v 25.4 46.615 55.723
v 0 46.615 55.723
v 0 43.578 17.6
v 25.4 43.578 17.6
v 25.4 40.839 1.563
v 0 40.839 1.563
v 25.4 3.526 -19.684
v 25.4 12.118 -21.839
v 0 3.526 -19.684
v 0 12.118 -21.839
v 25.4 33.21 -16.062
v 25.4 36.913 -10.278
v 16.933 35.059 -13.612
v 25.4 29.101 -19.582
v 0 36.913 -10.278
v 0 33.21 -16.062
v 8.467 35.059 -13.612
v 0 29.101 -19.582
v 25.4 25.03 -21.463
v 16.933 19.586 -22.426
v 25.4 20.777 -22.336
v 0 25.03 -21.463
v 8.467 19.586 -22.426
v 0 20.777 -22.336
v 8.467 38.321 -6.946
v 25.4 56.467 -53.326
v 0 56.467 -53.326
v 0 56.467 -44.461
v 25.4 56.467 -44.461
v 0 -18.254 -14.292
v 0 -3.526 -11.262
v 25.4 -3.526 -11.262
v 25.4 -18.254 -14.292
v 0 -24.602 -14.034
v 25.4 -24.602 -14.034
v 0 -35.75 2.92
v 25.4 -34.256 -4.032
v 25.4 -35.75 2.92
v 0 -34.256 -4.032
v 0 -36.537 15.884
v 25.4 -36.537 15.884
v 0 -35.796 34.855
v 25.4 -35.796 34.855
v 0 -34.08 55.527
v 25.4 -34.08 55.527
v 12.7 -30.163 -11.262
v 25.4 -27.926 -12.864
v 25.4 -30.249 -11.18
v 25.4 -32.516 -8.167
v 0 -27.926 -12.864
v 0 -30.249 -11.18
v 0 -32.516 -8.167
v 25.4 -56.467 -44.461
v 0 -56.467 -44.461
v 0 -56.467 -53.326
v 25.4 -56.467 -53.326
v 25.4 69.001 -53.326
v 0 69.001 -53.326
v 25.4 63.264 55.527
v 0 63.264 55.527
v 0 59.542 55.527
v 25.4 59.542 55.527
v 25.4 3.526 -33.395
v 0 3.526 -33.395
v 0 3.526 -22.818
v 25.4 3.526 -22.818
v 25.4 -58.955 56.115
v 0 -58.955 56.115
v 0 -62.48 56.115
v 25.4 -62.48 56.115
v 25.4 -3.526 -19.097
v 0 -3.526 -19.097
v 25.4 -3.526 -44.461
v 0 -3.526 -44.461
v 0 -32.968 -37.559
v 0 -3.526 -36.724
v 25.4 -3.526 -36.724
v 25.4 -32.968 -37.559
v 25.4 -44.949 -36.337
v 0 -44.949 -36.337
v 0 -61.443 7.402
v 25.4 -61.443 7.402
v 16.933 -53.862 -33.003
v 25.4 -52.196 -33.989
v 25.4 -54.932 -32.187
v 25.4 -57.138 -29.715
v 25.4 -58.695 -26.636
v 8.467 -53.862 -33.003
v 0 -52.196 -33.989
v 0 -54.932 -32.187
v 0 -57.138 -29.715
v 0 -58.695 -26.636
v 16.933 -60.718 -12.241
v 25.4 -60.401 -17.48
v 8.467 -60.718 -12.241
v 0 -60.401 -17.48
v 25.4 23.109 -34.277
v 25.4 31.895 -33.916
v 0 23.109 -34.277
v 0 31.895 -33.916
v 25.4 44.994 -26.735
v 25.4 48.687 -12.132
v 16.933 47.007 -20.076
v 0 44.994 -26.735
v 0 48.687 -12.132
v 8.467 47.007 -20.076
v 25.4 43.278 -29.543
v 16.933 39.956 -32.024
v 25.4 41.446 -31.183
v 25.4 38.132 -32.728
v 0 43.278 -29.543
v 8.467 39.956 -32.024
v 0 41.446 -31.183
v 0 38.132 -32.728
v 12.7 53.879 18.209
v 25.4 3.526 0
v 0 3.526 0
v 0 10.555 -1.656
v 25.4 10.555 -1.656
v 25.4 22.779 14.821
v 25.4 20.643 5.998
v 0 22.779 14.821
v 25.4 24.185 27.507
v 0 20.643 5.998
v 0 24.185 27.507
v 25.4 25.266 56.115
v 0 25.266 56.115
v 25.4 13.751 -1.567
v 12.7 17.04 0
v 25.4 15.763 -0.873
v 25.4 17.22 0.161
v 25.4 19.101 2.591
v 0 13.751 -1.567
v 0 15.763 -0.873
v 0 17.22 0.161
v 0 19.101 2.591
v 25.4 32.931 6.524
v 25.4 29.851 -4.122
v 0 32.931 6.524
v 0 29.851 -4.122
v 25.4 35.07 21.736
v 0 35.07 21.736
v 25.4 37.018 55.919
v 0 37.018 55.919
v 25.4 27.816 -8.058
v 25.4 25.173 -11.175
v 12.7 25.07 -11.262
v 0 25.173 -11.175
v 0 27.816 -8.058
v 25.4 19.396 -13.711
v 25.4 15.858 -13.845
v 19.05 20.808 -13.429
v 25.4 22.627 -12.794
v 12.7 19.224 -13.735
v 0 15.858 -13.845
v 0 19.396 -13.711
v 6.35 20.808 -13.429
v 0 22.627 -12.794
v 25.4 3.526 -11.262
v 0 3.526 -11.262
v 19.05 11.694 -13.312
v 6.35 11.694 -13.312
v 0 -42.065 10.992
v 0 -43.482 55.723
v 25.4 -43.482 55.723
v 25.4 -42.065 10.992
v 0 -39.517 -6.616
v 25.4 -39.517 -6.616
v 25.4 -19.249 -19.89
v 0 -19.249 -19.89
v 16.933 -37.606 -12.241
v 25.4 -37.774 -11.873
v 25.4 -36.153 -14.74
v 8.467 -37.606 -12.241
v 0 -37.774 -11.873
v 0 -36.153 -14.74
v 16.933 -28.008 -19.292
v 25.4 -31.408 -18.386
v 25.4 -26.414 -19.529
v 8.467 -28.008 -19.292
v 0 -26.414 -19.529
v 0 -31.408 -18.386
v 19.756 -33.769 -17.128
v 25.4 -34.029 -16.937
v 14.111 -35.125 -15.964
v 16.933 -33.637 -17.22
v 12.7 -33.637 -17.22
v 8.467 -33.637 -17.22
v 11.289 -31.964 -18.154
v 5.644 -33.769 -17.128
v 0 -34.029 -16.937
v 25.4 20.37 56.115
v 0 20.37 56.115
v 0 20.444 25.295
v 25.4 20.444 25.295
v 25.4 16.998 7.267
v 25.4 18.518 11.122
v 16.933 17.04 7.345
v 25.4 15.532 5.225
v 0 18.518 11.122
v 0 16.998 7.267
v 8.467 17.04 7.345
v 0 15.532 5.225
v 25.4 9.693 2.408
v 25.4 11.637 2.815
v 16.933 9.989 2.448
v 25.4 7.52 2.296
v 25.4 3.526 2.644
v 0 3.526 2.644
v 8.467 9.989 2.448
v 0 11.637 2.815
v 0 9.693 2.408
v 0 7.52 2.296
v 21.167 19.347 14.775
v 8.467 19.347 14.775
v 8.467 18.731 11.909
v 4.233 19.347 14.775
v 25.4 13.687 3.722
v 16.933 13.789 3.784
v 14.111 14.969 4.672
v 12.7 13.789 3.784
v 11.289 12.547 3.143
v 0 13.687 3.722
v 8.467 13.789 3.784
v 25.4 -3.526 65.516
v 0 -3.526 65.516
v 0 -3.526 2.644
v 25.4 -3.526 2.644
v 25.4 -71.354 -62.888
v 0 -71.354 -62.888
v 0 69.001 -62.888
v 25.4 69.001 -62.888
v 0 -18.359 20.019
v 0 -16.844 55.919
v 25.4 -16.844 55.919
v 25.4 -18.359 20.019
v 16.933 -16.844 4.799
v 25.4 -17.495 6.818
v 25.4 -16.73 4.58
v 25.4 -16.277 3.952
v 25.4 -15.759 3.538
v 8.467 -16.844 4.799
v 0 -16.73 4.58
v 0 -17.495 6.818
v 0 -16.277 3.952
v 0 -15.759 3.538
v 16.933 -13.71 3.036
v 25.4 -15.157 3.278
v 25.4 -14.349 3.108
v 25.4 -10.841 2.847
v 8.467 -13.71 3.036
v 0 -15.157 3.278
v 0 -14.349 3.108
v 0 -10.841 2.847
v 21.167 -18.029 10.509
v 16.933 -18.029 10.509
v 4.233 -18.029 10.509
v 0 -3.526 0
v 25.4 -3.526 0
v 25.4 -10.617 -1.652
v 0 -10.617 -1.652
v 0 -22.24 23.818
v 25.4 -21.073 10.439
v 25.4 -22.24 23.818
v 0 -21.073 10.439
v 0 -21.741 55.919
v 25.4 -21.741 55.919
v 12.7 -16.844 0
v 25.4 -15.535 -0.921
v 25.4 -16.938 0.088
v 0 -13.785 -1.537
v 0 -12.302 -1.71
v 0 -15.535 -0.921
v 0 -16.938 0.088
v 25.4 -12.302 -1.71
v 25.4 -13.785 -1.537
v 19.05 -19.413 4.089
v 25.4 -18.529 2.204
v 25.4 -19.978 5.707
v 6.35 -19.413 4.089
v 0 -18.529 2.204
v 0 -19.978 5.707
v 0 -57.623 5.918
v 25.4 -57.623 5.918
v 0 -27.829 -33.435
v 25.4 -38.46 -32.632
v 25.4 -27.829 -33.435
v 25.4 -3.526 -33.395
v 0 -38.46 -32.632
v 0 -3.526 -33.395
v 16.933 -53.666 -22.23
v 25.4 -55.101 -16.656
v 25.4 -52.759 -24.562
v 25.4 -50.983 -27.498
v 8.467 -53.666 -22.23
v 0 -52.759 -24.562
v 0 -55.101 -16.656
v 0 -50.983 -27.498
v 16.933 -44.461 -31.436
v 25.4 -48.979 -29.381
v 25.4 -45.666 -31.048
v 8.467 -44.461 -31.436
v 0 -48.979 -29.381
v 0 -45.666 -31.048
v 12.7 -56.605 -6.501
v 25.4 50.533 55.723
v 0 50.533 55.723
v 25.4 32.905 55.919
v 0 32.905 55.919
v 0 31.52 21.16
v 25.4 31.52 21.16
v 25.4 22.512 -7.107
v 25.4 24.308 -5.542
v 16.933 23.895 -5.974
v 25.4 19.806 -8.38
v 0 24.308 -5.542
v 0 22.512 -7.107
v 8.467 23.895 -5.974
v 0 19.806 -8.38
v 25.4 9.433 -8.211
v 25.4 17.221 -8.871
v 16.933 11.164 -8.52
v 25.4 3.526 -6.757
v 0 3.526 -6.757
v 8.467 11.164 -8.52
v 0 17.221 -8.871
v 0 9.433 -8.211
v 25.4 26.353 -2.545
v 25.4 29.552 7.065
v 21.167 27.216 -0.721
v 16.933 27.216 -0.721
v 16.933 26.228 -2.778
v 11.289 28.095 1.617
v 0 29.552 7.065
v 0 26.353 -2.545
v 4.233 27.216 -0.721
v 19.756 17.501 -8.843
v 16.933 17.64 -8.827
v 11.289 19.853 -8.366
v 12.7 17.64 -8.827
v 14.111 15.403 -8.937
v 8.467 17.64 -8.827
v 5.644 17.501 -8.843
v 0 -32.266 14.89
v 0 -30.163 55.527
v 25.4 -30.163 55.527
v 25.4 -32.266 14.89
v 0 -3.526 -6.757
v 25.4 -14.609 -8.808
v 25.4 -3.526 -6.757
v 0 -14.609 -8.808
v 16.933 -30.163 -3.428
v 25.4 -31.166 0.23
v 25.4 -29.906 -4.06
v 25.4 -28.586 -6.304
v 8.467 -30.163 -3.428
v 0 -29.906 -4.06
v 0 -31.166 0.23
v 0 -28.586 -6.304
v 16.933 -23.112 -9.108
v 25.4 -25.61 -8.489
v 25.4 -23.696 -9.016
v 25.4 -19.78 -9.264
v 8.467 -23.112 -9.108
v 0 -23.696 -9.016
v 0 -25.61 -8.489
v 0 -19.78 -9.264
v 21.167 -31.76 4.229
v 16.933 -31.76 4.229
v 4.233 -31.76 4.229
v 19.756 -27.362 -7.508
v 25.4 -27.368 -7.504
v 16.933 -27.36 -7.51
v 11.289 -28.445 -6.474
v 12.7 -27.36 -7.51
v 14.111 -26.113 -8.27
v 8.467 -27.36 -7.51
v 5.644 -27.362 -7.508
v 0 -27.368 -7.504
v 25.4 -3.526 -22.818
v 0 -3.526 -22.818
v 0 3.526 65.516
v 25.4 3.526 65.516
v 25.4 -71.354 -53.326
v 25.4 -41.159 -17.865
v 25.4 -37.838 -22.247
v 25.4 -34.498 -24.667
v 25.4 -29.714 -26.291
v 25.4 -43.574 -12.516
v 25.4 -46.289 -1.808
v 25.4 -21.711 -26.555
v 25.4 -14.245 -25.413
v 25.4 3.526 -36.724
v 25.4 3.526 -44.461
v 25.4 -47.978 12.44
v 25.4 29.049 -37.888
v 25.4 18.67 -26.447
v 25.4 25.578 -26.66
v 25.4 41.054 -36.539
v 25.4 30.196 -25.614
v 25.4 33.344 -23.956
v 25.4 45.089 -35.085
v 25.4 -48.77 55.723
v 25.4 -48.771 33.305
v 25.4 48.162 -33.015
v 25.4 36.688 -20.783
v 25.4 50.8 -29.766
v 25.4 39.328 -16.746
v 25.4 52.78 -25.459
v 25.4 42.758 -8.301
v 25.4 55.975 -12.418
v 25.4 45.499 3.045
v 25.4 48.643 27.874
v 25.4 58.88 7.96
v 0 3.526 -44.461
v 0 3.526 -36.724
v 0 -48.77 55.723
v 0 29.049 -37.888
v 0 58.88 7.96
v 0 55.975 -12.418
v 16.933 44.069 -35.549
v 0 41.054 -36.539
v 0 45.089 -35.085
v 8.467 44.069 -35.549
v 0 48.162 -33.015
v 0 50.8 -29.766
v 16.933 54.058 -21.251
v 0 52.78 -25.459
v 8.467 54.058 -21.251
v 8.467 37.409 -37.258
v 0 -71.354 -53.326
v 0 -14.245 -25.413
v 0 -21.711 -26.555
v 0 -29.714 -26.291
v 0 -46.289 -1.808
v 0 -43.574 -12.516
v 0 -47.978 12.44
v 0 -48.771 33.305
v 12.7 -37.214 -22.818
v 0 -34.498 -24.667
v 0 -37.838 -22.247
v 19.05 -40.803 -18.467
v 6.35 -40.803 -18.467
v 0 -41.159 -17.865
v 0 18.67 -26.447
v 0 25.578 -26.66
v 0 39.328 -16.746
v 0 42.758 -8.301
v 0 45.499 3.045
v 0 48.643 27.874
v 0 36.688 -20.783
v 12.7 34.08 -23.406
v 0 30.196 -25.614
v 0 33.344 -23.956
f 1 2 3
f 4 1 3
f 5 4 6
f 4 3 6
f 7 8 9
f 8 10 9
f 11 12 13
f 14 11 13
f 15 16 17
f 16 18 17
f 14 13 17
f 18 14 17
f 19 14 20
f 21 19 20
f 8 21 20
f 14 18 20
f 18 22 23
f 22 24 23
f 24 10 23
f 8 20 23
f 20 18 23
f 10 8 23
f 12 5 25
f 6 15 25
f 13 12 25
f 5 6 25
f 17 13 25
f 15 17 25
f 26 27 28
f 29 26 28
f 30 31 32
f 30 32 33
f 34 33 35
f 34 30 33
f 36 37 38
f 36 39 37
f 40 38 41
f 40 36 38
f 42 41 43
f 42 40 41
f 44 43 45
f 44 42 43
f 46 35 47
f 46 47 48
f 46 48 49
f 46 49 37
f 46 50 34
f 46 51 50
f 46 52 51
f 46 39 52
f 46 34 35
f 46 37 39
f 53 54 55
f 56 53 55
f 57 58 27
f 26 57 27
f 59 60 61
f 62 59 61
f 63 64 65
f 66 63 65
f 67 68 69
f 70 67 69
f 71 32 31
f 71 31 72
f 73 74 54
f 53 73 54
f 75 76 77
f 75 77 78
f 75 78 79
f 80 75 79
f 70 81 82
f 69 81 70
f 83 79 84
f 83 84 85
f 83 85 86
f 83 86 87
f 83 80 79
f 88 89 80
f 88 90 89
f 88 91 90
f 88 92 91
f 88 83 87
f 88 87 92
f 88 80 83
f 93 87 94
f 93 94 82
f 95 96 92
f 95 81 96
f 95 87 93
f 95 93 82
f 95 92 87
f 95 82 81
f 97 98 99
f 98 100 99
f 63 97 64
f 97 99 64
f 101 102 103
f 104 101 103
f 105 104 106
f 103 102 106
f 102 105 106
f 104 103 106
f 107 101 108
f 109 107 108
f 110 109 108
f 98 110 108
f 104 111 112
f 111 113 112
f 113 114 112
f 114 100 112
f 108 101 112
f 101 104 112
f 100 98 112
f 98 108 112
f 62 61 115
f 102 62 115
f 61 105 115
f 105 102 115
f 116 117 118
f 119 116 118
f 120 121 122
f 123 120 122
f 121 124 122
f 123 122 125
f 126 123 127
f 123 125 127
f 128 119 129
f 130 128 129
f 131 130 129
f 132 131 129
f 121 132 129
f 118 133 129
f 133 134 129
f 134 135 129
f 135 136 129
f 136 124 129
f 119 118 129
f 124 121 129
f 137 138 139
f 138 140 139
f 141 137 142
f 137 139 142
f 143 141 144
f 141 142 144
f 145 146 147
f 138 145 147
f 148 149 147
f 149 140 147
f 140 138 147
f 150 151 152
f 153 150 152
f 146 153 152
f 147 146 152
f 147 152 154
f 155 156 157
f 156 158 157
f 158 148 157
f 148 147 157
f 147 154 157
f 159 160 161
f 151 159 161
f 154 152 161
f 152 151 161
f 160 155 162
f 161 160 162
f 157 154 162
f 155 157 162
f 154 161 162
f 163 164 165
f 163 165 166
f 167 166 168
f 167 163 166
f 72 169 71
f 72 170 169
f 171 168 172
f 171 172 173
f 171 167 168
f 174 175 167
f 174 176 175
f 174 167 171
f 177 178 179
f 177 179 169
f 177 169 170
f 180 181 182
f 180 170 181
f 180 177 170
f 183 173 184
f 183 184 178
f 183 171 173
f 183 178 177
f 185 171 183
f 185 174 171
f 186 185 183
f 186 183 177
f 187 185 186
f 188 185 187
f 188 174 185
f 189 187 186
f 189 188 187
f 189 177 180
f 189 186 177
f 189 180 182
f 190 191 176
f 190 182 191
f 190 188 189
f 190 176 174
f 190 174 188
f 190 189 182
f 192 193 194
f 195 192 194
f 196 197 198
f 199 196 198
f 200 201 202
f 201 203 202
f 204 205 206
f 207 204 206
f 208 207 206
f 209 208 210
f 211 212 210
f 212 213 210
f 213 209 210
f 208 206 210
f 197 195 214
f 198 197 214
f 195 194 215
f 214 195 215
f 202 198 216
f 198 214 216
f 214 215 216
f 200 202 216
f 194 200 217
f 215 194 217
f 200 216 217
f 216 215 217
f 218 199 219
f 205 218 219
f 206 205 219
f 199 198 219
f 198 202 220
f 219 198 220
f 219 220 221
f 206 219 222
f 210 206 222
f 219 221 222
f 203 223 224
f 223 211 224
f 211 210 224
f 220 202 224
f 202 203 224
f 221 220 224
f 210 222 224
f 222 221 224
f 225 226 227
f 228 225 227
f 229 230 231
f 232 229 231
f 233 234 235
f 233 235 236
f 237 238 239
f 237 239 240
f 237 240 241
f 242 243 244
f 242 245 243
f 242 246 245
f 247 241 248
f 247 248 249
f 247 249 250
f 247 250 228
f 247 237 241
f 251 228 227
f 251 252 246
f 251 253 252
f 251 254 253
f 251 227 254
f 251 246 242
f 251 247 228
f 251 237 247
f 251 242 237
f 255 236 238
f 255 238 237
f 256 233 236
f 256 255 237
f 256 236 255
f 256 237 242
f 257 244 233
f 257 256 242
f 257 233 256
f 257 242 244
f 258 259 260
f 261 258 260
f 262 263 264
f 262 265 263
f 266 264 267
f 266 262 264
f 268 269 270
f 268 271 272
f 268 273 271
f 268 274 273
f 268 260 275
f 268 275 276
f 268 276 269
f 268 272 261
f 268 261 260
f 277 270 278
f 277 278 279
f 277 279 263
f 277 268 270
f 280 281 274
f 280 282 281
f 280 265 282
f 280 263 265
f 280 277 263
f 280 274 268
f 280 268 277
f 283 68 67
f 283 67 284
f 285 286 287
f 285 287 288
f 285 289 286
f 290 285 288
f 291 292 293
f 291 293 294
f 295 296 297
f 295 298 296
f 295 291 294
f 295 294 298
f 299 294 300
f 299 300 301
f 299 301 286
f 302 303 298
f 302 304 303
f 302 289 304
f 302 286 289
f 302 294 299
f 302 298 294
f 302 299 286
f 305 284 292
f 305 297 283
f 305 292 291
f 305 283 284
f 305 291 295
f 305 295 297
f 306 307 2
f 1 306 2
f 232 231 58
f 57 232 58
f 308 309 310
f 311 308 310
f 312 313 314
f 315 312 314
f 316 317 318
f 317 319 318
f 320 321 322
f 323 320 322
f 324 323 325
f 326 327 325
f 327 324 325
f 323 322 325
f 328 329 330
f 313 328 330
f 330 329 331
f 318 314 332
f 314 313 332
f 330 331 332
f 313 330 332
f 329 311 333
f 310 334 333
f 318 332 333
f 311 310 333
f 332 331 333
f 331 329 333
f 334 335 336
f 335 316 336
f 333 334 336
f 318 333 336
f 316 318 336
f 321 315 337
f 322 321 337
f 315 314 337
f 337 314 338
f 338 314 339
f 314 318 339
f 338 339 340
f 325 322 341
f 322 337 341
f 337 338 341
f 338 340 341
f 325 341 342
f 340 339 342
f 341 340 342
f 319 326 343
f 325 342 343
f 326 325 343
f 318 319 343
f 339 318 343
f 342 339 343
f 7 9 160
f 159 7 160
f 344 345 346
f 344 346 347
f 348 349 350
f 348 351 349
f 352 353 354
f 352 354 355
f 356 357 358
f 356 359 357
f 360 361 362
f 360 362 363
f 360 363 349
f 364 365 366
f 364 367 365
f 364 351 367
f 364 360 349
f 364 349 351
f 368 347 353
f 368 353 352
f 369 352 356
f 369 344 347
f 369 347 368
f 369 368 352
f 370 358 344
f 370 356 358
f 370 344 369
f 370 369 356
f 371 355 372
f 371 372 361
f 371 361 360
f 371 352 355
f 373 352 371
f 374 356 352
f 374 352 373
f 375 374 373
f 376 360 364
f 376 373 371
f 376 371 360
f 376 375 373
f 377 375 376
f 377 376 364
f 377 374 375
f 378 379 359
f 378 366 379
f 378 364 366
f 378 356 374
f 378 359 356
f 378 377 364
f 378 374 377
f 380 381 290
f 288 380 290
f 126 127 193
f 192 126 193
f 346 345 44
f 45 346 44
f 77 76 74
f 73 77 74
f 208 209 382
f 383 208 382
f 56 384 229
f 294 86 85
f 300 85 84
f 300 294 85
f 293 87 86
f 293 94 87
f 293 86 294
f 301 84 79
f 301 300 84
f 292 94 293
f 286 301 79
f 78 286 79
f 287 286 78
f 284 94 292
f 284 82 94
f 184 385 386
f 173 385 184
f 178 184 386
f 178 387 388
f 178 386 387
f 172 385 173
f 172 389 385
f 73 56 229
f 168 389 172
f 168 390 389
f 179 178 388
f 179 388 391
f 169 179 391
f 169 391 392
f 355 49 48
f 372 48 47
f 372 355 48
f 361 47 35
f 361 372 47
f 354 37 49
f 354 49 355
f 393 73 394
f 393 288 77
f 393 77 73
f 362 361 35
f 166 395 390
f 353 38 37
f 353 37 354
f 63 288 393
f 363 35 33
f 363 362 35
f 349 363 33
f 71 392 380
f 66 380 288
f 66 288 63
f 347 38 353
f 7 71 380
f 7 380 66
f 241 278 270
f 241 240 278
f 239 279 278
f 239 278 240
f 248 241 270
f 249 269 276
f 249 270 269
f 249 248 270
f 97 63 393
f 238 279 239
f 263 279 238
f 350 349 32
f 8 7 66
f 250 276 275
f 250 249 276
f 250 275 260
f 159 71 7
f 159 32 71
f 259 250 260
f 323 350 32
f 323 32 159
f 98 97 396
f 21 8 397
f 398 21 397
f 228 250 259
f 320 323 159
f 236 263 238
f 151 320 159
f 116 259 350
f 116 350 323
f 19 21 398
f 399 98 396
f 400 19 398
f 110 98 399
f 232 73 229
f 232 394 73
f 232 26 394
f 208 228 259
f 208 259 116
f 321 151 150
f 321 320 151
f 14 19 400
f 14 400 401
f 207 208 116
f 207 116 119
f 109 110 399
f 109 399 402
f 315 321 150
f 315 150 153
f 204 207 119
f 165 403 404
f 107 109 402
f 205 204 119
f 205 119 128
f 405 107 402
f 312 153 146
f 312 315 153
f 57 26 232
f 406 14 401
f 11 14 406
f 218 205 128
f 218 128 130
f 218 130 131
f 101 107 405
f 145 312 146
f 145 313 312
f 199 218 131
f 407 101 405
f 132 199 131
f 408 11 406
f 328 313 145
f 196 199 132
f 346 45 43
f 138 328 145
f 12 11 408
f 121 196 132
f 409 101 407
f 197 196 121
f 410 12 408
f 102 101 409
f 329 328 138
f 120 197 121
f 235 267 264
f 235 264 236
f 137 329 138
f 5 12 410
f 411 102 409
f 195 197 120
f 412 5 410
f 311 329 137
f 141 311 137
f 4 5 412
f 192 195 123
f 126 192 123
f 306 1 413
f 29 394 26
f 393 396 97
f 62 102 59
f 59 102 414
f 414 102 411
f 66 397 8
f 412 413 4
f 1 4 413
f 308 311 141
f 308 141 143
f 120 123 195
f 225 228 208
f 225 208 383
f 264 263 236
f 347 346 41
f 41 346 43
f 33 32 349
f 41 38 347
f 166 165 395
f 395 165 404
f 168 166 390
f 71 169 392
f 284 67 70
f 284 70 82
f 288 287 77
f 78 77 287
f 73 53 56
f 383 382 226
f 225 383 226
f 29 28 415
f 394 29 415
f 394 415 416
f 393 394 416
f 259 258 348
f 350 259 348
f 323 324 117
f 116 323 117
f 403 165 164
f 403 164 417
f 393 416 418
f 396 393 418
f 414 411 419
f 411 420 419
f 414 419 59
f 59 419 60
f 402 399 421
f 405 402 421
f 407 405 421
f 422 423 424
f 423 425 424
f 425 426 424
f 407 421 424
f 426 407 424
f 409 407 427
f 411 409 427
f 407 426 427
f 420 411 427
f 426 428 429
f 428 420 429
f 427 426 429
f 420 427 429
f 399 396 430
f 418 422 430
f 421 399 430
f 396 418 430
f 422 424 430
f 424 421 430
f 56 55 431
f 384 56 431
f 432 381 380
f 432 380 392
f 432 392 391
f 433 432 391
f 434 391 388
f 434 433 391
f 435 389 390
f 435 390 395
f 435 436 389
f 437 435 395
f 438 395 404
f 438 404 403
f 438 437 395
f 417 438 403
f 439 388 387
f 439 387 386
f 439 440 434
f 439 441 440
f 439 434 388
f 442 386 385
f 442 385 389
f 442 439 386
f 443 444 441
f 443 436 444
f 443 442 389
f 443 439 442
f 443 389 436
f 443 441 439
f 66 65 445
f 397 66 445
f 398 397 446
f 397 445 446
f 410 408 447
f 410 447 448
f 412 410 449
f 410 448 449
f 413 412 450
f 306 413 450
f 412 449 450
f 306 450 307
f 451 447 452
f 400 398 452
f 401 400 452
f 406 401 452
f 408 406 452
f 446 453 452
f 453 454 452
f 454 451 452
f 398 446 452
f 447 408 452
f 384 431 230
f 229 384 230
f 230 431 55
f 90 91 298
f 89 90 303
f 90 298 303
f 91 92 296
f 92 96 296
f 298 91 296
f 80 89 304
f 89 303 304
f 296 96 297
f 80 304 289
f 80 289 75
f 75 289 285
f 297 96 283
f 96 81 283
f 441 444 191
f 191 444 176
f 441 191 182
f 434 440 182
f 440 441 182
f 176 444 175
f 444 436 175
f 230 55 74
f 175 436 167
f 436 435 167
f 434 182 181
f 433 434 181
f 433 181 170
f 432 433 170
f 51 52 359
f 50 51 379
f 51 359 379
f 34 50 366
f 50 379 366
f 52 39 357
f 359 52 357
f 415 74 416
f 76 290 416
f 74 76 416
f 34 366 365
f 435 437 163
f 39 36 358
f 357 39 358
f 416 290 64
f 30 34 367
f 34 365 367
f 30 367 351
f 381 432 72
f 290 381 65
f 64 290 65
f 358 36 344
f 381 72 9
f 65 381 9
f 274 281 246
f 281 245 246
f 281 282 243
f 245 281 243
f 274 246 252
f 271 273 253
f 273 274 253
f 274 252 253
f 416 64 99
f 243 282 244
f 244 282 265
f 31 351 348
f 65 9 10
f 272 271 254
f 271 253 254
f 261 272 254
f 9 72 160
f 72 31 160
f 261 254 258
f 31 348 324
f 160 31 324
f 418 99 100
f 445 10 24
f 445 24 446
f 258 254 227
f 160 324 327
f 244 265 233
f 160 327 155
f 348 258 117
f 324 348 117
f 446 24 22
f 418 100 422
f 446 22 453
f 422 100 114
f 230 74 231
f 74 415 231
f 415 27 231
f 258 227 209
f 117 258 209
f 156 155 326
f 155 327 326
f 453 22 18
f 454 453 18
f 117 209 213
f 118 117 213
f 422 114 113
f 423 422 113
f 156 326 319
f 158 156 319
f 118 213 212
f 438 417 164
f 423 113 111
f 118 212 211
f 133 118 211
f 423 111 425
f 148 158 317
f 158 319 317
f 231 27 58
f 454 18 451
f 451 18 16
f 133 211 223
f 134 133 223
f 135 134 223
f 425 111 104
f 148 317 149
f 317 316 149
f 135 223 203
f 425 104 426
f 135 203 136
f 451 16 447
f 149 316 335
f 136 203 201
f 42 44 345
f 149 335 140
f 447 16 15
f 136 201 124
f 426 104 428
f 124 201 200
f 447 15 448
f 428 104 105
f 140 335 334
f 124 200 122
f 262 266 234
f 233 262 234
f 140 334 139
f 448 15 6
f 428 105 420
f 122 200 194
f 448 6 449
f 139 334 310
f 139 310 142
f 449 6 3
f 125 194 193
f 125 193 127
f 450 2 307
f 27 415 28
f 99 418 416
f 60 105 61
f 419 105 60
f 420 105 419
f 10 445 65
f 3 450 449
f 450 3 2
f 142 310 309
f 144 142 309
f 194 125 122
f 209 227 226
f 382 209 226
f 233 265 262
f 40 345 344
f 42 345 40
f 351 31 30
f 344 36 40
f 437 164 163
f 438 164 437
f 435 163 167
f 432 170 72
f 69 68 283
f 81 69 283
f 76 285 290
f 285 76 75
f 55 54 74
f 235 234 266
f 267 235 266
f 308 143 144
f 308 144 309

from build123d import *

# Parameters (mm, degrees)
F1_DEPTH = 25.4


with BuildPart() as f1:
    # F0 (on Right) → F1 (new body)
    with BuildSketch(Plane.YZ):
        Polygon((-71.3536882989, -62.8876967296), (69.0008763145, -62.8876967296), (69.0008763145, -53.3263756652), (56.4674834127, -53.3263756652), (56.4674834127, -44.460722529), (3.5255327821, -44.460722529), (-3.5255327821, -44.460722529), (-56.4674834127, -44.460722529), (-56.4674834127, -53.3263756652), (-71.3536882989, -53.3263756652), align=None)
        Polygon((-3.5255327821, -44.460722529), (3.5255327821, -44.460722529), (3.5255327821, -36.7242954671), (3.5255327821, -33.3946272731), (3.5255327821, -22.8180289268), (3.5255327821, -19.6842234582), (3.5255327821, -11.2621178851), (3.5255327821, -6.7572705448), (3.5255327821, 0), (3.5255327821, 2.6441493537), (3.5255327821, 55.5271357298), (3.5255327821, 65.5161440372), (-3.5255327821, 65.5161440372), (-3.5255327821, 55.5271357298), (-3.5255327821, 2.6441493537), (-3.5255327821, 0), (-3.5255327821, -6.7572705448), (-3.5255327821, -11.2621178851), (-3.5255327821, -19.096635282), (-3.5255327821, -22.8180289268), (-3.5255327821, -33.3946272731), (-3.5255327821, -36.7242954671), align=None)
        with BuildLine():
            Line((3.5255327821, -33.3946272731), (3.5255327821, -36.7242954671))
            add(Edge.make_bspline(
                [(3.5255327821, -36.7242954671), (19.5283458683, -37.9115714543), (46.0250919066, -39.8774102191), (57.086801682, -19.6662649434), (60.7679214598, 25.1450505181), (63.2637217641, 55.5271357298)],
                knots=[0, 0, 0, 0, 0.3293254758, 0.5452824731, 1, 1, 1, 1], degree=3))
            Line((63.2637217641, 55.5271357298), (59.542324394, 55.5271357298))
            add(Edge.make_bspline(
                [(59.542324394, 55.5271357298), (55.0176134141, 25.2060017822), (48.567756102, -18.0159826428), (42.1295842811, -35.83733265), (18.2774691458, -34.3280690461), (3.5255327821, -33.3946272731)],
                knots=[0, 0, 0, 0, 0.4727701883, 0.6739215543, 1, 1, 1, 1], degree=3))
        make_face()
        with BuildLine():
            add(Edge.make_bspline(
                [(-3.5255327821, -36.7242954671), (-24.2986218761, -37.8725969995), (-58.7436757829, -39.7766618214), (-61.2954694033, -9.4828326596), (-62.0184453958, 30.5452331605), (-62.4802745879, 56.1147257686)],
                knots=[0, 0, 0, 0, 0.3543477365, 0.5875643641, 1, 1, 1, 1], degree=3))
            Line((-3.5255327821, -36.7242954671), (-3.5255327821, -33.3946272731))
            add(Edge.make_bspline(
                [(-58.9547343552, 56.1147257686), (-58.5518682204, 23.6575228224), (-57.9849643897, -22.0154963092), (-44.9012456447, -34.1194273047), (-19.6651093216, -33.677352688), (-3.5255327821, -33.3946272731)],
                knots=[0, 0, 0, 0, 0.469569513, 0.6607672691, 1, 1, 1, 1], degree=3))
            Line((-58.9547343552, 56.1147257686), (-62.4802745879, 56.1147257686))
        make_face()
        with BuildLine():
            Line((3.5255327821, -19.6842234582), (3.5255327821, -22.8180289268))
            add(Edge.make_bspline(
                [(3.5255327821, -22.8180289268), (15.0074258417, -26.1390970683), (45.1615775397, -34.8610031178), (48.4786261835, 21.0817469198), (50.5326315761, 55.7229965925)],
                knots=[0, 0, 0, 0, 0.3807732074, 1, 1, 1, 1], degree=3))
            Line((50.5326315761, 55.7229965925), (46.6153733432, 55.7229965925))
            add(Edge.make_bspline(
                [(46.6153733432, 55.7229965925), (44.908074699, 27.2957561446), (42.3414520643, -15.4395901418), (19.7553258166, -24.281474601), (8.8547514125, -21.1937779169), (3.5255327821, -19.6842234582)],
                knots=[0, 0, 0, 0, 0.5038360705, 0.757428741, 1, 1, 1, 1], degree=3))
        make_face()
        with BuildLine():
            add(Edge.make_bspline(
                [(-3.5255327821, -22.8180289268), (-16.4749058597, -26.1817426868), (-49.3027052775, -34.7090528466), (-48.9708309091, 21.6160802328), (-48.7698689103, 55.7229965925)],
                knots=[0, 0, 0, 0, 0.3944636347, 1, 1, 1, 1], degree=3))
            Line((-3.5255327821, -22.8180289268), (-3.5255327821, -19.096635282))
            add(Edge.make_bspline(
                [(-43.4815697372, 55.7229965925), (-43.1493925226, 27.3035954994), (-42.6784250485, -12.9899976808), (-28.0554027813, -20.855813996), (-12.619326686, -19.7488037879), (-3.5255327821, -19.096635282)],
                knots=[0, 0, 0, 0, 0.4958091065, 0.7029680312, 1, 1, 1, 1], degree=3))
            Line((-43.4815697372, 55.7229965925), (-48.7698689103, 55.7229965925))
        make_face()
        with BuildLine():
            Line((3.5255327821, -6.7572705448), (3.5255327821, -11.2621178851))
            add(Edge.make_bspline(
                [(3.5255327821, -11.2621178851), (11.5964613447, -13.5255916132), (34.0307157026, -19.8172276939), (35.8520182308, 26.356535863), (37.0180904865, 55.9188649058)],
                knots=[0, 0, 0, 0, 0.3597591627, 1, 1, 1, 1], degree=3))
            Line((37.0180904865, 55.9188649058), (32.904971391, 55.9188649058))
            add(Edge.make_bspline(
                [(32.904971391, 55.9188649058), (32.383994158, 28.9003589611), (31.6256536405, -10.4280924226), (11.0670405767, -8.8444018794), (5.8199367134, -7.3922526292), (3.5255327821, -6.7572705448)],
                knots=[0, 0, 0, 0, 0.5525942812, 0.8043626605, 1, 1, 1, 1], degree=3))
        make_face()
        with BuildLine():
            add(Edge.make_bspline(
                [(-3.5255327821, -11.2621178851), (-13.9628252189, -13.979458265), (-40.9413722155, -21.0033004721), (-36.6880011003, 26.4390107496), (-34.0801477432, 55.5271357298)],
                knots=[0, 0, 0, 0, 0.3868737793, 1, 1, 1, 1], degree=3))
            Line((-3.5255327821, -11.2621178851), (-3.5255327821, -6.7572705448))
            add(Edge.make_bspline(
                [(-30.1628876477, 55.5271357298), (-31.985444285, 30.8578224877), (-34.5222487441, -3.4792305049), (-23.1181589343, -10.8027369268), (-10.8430847617, -8.2681915567), (-3.5255327821, -6.7572705448)],
                knots=[0, 0, 0, 0, 0.5075246544, 0.7064201903, 1, 1, 1, 1], degree=3))
            Line((-30.1628876477, 55.5271357298), (-34.0801477432, 55.5271357298))
        make_face()
        with BuildLine():
            Line((3.5255327821, 2.6441493537), (3.5255327821, 0))
            add(Edge.make_bspline(
                [(3.5255327821, 0), (8.5496923219, -1.4975662301), (23.8660891446, -6.0629703473), (24.703557743, 31.1252007713), (25.266315788, 56.1147257686)],
                knots=[0, 0, 0, 0, 0.3280249002, 1, 1, 1, 1], degree=3))
            Line((25.266315788, 56.1147257686), (20.3697439283, 56.1147257686))
            add(Edge.make_bspline(
                [(20.3697439283, 56.1147257686), (20.8792514929, 35.723351714), (21.6022738177, 6.7867476282), (10.2200746725, 1.8146451795), (5.6493055923, 2.3809979029), (3.5255327821, 2.6441493537)],
                knots=[0, 0, 0, 0, 0.5609253817, 0.7959873449, 1, 1, 1, 1], degree=3))
        make_face()
        with BuildLine():
            add(Edge.make_bspline(
                [(-3.5255327821, 0), (-8.5619762859, -1.4869958031), (-23.9379763758, -6.0267166565), (-22.6242184339, 31.0121575033), (-21.7407848686, 55.9188649058)],
                knots=[0, 0, 0, 0, 0.3275522551, 1, 1, 1, 1], degree=3))
            Line((-3.5255327821, 0), (-3.5255327821, 2.6441493537))
            add(Edge.make_bspline(
                [(-16.8442111462, 55.9188649058), (-18.1566177579, 33.0480107342), (-19.8170856078, 4.1116142591), (-13.5367557364, 2.8459613048), (-7.3849929996, 2.7219505575), (-3.5255327821, 2.6441493537)],
                knots=[0, 0, 0, 0, 0.5842044945, 0.7391404252, 1, 1, 1, 1], degree=3))
            Line((-16.8442111462, 55.9188649058), (-21.7407848686, 55.9188649058))
        make_face()
    extrude(amount=F1_DEPTH)


solid = f1.part
